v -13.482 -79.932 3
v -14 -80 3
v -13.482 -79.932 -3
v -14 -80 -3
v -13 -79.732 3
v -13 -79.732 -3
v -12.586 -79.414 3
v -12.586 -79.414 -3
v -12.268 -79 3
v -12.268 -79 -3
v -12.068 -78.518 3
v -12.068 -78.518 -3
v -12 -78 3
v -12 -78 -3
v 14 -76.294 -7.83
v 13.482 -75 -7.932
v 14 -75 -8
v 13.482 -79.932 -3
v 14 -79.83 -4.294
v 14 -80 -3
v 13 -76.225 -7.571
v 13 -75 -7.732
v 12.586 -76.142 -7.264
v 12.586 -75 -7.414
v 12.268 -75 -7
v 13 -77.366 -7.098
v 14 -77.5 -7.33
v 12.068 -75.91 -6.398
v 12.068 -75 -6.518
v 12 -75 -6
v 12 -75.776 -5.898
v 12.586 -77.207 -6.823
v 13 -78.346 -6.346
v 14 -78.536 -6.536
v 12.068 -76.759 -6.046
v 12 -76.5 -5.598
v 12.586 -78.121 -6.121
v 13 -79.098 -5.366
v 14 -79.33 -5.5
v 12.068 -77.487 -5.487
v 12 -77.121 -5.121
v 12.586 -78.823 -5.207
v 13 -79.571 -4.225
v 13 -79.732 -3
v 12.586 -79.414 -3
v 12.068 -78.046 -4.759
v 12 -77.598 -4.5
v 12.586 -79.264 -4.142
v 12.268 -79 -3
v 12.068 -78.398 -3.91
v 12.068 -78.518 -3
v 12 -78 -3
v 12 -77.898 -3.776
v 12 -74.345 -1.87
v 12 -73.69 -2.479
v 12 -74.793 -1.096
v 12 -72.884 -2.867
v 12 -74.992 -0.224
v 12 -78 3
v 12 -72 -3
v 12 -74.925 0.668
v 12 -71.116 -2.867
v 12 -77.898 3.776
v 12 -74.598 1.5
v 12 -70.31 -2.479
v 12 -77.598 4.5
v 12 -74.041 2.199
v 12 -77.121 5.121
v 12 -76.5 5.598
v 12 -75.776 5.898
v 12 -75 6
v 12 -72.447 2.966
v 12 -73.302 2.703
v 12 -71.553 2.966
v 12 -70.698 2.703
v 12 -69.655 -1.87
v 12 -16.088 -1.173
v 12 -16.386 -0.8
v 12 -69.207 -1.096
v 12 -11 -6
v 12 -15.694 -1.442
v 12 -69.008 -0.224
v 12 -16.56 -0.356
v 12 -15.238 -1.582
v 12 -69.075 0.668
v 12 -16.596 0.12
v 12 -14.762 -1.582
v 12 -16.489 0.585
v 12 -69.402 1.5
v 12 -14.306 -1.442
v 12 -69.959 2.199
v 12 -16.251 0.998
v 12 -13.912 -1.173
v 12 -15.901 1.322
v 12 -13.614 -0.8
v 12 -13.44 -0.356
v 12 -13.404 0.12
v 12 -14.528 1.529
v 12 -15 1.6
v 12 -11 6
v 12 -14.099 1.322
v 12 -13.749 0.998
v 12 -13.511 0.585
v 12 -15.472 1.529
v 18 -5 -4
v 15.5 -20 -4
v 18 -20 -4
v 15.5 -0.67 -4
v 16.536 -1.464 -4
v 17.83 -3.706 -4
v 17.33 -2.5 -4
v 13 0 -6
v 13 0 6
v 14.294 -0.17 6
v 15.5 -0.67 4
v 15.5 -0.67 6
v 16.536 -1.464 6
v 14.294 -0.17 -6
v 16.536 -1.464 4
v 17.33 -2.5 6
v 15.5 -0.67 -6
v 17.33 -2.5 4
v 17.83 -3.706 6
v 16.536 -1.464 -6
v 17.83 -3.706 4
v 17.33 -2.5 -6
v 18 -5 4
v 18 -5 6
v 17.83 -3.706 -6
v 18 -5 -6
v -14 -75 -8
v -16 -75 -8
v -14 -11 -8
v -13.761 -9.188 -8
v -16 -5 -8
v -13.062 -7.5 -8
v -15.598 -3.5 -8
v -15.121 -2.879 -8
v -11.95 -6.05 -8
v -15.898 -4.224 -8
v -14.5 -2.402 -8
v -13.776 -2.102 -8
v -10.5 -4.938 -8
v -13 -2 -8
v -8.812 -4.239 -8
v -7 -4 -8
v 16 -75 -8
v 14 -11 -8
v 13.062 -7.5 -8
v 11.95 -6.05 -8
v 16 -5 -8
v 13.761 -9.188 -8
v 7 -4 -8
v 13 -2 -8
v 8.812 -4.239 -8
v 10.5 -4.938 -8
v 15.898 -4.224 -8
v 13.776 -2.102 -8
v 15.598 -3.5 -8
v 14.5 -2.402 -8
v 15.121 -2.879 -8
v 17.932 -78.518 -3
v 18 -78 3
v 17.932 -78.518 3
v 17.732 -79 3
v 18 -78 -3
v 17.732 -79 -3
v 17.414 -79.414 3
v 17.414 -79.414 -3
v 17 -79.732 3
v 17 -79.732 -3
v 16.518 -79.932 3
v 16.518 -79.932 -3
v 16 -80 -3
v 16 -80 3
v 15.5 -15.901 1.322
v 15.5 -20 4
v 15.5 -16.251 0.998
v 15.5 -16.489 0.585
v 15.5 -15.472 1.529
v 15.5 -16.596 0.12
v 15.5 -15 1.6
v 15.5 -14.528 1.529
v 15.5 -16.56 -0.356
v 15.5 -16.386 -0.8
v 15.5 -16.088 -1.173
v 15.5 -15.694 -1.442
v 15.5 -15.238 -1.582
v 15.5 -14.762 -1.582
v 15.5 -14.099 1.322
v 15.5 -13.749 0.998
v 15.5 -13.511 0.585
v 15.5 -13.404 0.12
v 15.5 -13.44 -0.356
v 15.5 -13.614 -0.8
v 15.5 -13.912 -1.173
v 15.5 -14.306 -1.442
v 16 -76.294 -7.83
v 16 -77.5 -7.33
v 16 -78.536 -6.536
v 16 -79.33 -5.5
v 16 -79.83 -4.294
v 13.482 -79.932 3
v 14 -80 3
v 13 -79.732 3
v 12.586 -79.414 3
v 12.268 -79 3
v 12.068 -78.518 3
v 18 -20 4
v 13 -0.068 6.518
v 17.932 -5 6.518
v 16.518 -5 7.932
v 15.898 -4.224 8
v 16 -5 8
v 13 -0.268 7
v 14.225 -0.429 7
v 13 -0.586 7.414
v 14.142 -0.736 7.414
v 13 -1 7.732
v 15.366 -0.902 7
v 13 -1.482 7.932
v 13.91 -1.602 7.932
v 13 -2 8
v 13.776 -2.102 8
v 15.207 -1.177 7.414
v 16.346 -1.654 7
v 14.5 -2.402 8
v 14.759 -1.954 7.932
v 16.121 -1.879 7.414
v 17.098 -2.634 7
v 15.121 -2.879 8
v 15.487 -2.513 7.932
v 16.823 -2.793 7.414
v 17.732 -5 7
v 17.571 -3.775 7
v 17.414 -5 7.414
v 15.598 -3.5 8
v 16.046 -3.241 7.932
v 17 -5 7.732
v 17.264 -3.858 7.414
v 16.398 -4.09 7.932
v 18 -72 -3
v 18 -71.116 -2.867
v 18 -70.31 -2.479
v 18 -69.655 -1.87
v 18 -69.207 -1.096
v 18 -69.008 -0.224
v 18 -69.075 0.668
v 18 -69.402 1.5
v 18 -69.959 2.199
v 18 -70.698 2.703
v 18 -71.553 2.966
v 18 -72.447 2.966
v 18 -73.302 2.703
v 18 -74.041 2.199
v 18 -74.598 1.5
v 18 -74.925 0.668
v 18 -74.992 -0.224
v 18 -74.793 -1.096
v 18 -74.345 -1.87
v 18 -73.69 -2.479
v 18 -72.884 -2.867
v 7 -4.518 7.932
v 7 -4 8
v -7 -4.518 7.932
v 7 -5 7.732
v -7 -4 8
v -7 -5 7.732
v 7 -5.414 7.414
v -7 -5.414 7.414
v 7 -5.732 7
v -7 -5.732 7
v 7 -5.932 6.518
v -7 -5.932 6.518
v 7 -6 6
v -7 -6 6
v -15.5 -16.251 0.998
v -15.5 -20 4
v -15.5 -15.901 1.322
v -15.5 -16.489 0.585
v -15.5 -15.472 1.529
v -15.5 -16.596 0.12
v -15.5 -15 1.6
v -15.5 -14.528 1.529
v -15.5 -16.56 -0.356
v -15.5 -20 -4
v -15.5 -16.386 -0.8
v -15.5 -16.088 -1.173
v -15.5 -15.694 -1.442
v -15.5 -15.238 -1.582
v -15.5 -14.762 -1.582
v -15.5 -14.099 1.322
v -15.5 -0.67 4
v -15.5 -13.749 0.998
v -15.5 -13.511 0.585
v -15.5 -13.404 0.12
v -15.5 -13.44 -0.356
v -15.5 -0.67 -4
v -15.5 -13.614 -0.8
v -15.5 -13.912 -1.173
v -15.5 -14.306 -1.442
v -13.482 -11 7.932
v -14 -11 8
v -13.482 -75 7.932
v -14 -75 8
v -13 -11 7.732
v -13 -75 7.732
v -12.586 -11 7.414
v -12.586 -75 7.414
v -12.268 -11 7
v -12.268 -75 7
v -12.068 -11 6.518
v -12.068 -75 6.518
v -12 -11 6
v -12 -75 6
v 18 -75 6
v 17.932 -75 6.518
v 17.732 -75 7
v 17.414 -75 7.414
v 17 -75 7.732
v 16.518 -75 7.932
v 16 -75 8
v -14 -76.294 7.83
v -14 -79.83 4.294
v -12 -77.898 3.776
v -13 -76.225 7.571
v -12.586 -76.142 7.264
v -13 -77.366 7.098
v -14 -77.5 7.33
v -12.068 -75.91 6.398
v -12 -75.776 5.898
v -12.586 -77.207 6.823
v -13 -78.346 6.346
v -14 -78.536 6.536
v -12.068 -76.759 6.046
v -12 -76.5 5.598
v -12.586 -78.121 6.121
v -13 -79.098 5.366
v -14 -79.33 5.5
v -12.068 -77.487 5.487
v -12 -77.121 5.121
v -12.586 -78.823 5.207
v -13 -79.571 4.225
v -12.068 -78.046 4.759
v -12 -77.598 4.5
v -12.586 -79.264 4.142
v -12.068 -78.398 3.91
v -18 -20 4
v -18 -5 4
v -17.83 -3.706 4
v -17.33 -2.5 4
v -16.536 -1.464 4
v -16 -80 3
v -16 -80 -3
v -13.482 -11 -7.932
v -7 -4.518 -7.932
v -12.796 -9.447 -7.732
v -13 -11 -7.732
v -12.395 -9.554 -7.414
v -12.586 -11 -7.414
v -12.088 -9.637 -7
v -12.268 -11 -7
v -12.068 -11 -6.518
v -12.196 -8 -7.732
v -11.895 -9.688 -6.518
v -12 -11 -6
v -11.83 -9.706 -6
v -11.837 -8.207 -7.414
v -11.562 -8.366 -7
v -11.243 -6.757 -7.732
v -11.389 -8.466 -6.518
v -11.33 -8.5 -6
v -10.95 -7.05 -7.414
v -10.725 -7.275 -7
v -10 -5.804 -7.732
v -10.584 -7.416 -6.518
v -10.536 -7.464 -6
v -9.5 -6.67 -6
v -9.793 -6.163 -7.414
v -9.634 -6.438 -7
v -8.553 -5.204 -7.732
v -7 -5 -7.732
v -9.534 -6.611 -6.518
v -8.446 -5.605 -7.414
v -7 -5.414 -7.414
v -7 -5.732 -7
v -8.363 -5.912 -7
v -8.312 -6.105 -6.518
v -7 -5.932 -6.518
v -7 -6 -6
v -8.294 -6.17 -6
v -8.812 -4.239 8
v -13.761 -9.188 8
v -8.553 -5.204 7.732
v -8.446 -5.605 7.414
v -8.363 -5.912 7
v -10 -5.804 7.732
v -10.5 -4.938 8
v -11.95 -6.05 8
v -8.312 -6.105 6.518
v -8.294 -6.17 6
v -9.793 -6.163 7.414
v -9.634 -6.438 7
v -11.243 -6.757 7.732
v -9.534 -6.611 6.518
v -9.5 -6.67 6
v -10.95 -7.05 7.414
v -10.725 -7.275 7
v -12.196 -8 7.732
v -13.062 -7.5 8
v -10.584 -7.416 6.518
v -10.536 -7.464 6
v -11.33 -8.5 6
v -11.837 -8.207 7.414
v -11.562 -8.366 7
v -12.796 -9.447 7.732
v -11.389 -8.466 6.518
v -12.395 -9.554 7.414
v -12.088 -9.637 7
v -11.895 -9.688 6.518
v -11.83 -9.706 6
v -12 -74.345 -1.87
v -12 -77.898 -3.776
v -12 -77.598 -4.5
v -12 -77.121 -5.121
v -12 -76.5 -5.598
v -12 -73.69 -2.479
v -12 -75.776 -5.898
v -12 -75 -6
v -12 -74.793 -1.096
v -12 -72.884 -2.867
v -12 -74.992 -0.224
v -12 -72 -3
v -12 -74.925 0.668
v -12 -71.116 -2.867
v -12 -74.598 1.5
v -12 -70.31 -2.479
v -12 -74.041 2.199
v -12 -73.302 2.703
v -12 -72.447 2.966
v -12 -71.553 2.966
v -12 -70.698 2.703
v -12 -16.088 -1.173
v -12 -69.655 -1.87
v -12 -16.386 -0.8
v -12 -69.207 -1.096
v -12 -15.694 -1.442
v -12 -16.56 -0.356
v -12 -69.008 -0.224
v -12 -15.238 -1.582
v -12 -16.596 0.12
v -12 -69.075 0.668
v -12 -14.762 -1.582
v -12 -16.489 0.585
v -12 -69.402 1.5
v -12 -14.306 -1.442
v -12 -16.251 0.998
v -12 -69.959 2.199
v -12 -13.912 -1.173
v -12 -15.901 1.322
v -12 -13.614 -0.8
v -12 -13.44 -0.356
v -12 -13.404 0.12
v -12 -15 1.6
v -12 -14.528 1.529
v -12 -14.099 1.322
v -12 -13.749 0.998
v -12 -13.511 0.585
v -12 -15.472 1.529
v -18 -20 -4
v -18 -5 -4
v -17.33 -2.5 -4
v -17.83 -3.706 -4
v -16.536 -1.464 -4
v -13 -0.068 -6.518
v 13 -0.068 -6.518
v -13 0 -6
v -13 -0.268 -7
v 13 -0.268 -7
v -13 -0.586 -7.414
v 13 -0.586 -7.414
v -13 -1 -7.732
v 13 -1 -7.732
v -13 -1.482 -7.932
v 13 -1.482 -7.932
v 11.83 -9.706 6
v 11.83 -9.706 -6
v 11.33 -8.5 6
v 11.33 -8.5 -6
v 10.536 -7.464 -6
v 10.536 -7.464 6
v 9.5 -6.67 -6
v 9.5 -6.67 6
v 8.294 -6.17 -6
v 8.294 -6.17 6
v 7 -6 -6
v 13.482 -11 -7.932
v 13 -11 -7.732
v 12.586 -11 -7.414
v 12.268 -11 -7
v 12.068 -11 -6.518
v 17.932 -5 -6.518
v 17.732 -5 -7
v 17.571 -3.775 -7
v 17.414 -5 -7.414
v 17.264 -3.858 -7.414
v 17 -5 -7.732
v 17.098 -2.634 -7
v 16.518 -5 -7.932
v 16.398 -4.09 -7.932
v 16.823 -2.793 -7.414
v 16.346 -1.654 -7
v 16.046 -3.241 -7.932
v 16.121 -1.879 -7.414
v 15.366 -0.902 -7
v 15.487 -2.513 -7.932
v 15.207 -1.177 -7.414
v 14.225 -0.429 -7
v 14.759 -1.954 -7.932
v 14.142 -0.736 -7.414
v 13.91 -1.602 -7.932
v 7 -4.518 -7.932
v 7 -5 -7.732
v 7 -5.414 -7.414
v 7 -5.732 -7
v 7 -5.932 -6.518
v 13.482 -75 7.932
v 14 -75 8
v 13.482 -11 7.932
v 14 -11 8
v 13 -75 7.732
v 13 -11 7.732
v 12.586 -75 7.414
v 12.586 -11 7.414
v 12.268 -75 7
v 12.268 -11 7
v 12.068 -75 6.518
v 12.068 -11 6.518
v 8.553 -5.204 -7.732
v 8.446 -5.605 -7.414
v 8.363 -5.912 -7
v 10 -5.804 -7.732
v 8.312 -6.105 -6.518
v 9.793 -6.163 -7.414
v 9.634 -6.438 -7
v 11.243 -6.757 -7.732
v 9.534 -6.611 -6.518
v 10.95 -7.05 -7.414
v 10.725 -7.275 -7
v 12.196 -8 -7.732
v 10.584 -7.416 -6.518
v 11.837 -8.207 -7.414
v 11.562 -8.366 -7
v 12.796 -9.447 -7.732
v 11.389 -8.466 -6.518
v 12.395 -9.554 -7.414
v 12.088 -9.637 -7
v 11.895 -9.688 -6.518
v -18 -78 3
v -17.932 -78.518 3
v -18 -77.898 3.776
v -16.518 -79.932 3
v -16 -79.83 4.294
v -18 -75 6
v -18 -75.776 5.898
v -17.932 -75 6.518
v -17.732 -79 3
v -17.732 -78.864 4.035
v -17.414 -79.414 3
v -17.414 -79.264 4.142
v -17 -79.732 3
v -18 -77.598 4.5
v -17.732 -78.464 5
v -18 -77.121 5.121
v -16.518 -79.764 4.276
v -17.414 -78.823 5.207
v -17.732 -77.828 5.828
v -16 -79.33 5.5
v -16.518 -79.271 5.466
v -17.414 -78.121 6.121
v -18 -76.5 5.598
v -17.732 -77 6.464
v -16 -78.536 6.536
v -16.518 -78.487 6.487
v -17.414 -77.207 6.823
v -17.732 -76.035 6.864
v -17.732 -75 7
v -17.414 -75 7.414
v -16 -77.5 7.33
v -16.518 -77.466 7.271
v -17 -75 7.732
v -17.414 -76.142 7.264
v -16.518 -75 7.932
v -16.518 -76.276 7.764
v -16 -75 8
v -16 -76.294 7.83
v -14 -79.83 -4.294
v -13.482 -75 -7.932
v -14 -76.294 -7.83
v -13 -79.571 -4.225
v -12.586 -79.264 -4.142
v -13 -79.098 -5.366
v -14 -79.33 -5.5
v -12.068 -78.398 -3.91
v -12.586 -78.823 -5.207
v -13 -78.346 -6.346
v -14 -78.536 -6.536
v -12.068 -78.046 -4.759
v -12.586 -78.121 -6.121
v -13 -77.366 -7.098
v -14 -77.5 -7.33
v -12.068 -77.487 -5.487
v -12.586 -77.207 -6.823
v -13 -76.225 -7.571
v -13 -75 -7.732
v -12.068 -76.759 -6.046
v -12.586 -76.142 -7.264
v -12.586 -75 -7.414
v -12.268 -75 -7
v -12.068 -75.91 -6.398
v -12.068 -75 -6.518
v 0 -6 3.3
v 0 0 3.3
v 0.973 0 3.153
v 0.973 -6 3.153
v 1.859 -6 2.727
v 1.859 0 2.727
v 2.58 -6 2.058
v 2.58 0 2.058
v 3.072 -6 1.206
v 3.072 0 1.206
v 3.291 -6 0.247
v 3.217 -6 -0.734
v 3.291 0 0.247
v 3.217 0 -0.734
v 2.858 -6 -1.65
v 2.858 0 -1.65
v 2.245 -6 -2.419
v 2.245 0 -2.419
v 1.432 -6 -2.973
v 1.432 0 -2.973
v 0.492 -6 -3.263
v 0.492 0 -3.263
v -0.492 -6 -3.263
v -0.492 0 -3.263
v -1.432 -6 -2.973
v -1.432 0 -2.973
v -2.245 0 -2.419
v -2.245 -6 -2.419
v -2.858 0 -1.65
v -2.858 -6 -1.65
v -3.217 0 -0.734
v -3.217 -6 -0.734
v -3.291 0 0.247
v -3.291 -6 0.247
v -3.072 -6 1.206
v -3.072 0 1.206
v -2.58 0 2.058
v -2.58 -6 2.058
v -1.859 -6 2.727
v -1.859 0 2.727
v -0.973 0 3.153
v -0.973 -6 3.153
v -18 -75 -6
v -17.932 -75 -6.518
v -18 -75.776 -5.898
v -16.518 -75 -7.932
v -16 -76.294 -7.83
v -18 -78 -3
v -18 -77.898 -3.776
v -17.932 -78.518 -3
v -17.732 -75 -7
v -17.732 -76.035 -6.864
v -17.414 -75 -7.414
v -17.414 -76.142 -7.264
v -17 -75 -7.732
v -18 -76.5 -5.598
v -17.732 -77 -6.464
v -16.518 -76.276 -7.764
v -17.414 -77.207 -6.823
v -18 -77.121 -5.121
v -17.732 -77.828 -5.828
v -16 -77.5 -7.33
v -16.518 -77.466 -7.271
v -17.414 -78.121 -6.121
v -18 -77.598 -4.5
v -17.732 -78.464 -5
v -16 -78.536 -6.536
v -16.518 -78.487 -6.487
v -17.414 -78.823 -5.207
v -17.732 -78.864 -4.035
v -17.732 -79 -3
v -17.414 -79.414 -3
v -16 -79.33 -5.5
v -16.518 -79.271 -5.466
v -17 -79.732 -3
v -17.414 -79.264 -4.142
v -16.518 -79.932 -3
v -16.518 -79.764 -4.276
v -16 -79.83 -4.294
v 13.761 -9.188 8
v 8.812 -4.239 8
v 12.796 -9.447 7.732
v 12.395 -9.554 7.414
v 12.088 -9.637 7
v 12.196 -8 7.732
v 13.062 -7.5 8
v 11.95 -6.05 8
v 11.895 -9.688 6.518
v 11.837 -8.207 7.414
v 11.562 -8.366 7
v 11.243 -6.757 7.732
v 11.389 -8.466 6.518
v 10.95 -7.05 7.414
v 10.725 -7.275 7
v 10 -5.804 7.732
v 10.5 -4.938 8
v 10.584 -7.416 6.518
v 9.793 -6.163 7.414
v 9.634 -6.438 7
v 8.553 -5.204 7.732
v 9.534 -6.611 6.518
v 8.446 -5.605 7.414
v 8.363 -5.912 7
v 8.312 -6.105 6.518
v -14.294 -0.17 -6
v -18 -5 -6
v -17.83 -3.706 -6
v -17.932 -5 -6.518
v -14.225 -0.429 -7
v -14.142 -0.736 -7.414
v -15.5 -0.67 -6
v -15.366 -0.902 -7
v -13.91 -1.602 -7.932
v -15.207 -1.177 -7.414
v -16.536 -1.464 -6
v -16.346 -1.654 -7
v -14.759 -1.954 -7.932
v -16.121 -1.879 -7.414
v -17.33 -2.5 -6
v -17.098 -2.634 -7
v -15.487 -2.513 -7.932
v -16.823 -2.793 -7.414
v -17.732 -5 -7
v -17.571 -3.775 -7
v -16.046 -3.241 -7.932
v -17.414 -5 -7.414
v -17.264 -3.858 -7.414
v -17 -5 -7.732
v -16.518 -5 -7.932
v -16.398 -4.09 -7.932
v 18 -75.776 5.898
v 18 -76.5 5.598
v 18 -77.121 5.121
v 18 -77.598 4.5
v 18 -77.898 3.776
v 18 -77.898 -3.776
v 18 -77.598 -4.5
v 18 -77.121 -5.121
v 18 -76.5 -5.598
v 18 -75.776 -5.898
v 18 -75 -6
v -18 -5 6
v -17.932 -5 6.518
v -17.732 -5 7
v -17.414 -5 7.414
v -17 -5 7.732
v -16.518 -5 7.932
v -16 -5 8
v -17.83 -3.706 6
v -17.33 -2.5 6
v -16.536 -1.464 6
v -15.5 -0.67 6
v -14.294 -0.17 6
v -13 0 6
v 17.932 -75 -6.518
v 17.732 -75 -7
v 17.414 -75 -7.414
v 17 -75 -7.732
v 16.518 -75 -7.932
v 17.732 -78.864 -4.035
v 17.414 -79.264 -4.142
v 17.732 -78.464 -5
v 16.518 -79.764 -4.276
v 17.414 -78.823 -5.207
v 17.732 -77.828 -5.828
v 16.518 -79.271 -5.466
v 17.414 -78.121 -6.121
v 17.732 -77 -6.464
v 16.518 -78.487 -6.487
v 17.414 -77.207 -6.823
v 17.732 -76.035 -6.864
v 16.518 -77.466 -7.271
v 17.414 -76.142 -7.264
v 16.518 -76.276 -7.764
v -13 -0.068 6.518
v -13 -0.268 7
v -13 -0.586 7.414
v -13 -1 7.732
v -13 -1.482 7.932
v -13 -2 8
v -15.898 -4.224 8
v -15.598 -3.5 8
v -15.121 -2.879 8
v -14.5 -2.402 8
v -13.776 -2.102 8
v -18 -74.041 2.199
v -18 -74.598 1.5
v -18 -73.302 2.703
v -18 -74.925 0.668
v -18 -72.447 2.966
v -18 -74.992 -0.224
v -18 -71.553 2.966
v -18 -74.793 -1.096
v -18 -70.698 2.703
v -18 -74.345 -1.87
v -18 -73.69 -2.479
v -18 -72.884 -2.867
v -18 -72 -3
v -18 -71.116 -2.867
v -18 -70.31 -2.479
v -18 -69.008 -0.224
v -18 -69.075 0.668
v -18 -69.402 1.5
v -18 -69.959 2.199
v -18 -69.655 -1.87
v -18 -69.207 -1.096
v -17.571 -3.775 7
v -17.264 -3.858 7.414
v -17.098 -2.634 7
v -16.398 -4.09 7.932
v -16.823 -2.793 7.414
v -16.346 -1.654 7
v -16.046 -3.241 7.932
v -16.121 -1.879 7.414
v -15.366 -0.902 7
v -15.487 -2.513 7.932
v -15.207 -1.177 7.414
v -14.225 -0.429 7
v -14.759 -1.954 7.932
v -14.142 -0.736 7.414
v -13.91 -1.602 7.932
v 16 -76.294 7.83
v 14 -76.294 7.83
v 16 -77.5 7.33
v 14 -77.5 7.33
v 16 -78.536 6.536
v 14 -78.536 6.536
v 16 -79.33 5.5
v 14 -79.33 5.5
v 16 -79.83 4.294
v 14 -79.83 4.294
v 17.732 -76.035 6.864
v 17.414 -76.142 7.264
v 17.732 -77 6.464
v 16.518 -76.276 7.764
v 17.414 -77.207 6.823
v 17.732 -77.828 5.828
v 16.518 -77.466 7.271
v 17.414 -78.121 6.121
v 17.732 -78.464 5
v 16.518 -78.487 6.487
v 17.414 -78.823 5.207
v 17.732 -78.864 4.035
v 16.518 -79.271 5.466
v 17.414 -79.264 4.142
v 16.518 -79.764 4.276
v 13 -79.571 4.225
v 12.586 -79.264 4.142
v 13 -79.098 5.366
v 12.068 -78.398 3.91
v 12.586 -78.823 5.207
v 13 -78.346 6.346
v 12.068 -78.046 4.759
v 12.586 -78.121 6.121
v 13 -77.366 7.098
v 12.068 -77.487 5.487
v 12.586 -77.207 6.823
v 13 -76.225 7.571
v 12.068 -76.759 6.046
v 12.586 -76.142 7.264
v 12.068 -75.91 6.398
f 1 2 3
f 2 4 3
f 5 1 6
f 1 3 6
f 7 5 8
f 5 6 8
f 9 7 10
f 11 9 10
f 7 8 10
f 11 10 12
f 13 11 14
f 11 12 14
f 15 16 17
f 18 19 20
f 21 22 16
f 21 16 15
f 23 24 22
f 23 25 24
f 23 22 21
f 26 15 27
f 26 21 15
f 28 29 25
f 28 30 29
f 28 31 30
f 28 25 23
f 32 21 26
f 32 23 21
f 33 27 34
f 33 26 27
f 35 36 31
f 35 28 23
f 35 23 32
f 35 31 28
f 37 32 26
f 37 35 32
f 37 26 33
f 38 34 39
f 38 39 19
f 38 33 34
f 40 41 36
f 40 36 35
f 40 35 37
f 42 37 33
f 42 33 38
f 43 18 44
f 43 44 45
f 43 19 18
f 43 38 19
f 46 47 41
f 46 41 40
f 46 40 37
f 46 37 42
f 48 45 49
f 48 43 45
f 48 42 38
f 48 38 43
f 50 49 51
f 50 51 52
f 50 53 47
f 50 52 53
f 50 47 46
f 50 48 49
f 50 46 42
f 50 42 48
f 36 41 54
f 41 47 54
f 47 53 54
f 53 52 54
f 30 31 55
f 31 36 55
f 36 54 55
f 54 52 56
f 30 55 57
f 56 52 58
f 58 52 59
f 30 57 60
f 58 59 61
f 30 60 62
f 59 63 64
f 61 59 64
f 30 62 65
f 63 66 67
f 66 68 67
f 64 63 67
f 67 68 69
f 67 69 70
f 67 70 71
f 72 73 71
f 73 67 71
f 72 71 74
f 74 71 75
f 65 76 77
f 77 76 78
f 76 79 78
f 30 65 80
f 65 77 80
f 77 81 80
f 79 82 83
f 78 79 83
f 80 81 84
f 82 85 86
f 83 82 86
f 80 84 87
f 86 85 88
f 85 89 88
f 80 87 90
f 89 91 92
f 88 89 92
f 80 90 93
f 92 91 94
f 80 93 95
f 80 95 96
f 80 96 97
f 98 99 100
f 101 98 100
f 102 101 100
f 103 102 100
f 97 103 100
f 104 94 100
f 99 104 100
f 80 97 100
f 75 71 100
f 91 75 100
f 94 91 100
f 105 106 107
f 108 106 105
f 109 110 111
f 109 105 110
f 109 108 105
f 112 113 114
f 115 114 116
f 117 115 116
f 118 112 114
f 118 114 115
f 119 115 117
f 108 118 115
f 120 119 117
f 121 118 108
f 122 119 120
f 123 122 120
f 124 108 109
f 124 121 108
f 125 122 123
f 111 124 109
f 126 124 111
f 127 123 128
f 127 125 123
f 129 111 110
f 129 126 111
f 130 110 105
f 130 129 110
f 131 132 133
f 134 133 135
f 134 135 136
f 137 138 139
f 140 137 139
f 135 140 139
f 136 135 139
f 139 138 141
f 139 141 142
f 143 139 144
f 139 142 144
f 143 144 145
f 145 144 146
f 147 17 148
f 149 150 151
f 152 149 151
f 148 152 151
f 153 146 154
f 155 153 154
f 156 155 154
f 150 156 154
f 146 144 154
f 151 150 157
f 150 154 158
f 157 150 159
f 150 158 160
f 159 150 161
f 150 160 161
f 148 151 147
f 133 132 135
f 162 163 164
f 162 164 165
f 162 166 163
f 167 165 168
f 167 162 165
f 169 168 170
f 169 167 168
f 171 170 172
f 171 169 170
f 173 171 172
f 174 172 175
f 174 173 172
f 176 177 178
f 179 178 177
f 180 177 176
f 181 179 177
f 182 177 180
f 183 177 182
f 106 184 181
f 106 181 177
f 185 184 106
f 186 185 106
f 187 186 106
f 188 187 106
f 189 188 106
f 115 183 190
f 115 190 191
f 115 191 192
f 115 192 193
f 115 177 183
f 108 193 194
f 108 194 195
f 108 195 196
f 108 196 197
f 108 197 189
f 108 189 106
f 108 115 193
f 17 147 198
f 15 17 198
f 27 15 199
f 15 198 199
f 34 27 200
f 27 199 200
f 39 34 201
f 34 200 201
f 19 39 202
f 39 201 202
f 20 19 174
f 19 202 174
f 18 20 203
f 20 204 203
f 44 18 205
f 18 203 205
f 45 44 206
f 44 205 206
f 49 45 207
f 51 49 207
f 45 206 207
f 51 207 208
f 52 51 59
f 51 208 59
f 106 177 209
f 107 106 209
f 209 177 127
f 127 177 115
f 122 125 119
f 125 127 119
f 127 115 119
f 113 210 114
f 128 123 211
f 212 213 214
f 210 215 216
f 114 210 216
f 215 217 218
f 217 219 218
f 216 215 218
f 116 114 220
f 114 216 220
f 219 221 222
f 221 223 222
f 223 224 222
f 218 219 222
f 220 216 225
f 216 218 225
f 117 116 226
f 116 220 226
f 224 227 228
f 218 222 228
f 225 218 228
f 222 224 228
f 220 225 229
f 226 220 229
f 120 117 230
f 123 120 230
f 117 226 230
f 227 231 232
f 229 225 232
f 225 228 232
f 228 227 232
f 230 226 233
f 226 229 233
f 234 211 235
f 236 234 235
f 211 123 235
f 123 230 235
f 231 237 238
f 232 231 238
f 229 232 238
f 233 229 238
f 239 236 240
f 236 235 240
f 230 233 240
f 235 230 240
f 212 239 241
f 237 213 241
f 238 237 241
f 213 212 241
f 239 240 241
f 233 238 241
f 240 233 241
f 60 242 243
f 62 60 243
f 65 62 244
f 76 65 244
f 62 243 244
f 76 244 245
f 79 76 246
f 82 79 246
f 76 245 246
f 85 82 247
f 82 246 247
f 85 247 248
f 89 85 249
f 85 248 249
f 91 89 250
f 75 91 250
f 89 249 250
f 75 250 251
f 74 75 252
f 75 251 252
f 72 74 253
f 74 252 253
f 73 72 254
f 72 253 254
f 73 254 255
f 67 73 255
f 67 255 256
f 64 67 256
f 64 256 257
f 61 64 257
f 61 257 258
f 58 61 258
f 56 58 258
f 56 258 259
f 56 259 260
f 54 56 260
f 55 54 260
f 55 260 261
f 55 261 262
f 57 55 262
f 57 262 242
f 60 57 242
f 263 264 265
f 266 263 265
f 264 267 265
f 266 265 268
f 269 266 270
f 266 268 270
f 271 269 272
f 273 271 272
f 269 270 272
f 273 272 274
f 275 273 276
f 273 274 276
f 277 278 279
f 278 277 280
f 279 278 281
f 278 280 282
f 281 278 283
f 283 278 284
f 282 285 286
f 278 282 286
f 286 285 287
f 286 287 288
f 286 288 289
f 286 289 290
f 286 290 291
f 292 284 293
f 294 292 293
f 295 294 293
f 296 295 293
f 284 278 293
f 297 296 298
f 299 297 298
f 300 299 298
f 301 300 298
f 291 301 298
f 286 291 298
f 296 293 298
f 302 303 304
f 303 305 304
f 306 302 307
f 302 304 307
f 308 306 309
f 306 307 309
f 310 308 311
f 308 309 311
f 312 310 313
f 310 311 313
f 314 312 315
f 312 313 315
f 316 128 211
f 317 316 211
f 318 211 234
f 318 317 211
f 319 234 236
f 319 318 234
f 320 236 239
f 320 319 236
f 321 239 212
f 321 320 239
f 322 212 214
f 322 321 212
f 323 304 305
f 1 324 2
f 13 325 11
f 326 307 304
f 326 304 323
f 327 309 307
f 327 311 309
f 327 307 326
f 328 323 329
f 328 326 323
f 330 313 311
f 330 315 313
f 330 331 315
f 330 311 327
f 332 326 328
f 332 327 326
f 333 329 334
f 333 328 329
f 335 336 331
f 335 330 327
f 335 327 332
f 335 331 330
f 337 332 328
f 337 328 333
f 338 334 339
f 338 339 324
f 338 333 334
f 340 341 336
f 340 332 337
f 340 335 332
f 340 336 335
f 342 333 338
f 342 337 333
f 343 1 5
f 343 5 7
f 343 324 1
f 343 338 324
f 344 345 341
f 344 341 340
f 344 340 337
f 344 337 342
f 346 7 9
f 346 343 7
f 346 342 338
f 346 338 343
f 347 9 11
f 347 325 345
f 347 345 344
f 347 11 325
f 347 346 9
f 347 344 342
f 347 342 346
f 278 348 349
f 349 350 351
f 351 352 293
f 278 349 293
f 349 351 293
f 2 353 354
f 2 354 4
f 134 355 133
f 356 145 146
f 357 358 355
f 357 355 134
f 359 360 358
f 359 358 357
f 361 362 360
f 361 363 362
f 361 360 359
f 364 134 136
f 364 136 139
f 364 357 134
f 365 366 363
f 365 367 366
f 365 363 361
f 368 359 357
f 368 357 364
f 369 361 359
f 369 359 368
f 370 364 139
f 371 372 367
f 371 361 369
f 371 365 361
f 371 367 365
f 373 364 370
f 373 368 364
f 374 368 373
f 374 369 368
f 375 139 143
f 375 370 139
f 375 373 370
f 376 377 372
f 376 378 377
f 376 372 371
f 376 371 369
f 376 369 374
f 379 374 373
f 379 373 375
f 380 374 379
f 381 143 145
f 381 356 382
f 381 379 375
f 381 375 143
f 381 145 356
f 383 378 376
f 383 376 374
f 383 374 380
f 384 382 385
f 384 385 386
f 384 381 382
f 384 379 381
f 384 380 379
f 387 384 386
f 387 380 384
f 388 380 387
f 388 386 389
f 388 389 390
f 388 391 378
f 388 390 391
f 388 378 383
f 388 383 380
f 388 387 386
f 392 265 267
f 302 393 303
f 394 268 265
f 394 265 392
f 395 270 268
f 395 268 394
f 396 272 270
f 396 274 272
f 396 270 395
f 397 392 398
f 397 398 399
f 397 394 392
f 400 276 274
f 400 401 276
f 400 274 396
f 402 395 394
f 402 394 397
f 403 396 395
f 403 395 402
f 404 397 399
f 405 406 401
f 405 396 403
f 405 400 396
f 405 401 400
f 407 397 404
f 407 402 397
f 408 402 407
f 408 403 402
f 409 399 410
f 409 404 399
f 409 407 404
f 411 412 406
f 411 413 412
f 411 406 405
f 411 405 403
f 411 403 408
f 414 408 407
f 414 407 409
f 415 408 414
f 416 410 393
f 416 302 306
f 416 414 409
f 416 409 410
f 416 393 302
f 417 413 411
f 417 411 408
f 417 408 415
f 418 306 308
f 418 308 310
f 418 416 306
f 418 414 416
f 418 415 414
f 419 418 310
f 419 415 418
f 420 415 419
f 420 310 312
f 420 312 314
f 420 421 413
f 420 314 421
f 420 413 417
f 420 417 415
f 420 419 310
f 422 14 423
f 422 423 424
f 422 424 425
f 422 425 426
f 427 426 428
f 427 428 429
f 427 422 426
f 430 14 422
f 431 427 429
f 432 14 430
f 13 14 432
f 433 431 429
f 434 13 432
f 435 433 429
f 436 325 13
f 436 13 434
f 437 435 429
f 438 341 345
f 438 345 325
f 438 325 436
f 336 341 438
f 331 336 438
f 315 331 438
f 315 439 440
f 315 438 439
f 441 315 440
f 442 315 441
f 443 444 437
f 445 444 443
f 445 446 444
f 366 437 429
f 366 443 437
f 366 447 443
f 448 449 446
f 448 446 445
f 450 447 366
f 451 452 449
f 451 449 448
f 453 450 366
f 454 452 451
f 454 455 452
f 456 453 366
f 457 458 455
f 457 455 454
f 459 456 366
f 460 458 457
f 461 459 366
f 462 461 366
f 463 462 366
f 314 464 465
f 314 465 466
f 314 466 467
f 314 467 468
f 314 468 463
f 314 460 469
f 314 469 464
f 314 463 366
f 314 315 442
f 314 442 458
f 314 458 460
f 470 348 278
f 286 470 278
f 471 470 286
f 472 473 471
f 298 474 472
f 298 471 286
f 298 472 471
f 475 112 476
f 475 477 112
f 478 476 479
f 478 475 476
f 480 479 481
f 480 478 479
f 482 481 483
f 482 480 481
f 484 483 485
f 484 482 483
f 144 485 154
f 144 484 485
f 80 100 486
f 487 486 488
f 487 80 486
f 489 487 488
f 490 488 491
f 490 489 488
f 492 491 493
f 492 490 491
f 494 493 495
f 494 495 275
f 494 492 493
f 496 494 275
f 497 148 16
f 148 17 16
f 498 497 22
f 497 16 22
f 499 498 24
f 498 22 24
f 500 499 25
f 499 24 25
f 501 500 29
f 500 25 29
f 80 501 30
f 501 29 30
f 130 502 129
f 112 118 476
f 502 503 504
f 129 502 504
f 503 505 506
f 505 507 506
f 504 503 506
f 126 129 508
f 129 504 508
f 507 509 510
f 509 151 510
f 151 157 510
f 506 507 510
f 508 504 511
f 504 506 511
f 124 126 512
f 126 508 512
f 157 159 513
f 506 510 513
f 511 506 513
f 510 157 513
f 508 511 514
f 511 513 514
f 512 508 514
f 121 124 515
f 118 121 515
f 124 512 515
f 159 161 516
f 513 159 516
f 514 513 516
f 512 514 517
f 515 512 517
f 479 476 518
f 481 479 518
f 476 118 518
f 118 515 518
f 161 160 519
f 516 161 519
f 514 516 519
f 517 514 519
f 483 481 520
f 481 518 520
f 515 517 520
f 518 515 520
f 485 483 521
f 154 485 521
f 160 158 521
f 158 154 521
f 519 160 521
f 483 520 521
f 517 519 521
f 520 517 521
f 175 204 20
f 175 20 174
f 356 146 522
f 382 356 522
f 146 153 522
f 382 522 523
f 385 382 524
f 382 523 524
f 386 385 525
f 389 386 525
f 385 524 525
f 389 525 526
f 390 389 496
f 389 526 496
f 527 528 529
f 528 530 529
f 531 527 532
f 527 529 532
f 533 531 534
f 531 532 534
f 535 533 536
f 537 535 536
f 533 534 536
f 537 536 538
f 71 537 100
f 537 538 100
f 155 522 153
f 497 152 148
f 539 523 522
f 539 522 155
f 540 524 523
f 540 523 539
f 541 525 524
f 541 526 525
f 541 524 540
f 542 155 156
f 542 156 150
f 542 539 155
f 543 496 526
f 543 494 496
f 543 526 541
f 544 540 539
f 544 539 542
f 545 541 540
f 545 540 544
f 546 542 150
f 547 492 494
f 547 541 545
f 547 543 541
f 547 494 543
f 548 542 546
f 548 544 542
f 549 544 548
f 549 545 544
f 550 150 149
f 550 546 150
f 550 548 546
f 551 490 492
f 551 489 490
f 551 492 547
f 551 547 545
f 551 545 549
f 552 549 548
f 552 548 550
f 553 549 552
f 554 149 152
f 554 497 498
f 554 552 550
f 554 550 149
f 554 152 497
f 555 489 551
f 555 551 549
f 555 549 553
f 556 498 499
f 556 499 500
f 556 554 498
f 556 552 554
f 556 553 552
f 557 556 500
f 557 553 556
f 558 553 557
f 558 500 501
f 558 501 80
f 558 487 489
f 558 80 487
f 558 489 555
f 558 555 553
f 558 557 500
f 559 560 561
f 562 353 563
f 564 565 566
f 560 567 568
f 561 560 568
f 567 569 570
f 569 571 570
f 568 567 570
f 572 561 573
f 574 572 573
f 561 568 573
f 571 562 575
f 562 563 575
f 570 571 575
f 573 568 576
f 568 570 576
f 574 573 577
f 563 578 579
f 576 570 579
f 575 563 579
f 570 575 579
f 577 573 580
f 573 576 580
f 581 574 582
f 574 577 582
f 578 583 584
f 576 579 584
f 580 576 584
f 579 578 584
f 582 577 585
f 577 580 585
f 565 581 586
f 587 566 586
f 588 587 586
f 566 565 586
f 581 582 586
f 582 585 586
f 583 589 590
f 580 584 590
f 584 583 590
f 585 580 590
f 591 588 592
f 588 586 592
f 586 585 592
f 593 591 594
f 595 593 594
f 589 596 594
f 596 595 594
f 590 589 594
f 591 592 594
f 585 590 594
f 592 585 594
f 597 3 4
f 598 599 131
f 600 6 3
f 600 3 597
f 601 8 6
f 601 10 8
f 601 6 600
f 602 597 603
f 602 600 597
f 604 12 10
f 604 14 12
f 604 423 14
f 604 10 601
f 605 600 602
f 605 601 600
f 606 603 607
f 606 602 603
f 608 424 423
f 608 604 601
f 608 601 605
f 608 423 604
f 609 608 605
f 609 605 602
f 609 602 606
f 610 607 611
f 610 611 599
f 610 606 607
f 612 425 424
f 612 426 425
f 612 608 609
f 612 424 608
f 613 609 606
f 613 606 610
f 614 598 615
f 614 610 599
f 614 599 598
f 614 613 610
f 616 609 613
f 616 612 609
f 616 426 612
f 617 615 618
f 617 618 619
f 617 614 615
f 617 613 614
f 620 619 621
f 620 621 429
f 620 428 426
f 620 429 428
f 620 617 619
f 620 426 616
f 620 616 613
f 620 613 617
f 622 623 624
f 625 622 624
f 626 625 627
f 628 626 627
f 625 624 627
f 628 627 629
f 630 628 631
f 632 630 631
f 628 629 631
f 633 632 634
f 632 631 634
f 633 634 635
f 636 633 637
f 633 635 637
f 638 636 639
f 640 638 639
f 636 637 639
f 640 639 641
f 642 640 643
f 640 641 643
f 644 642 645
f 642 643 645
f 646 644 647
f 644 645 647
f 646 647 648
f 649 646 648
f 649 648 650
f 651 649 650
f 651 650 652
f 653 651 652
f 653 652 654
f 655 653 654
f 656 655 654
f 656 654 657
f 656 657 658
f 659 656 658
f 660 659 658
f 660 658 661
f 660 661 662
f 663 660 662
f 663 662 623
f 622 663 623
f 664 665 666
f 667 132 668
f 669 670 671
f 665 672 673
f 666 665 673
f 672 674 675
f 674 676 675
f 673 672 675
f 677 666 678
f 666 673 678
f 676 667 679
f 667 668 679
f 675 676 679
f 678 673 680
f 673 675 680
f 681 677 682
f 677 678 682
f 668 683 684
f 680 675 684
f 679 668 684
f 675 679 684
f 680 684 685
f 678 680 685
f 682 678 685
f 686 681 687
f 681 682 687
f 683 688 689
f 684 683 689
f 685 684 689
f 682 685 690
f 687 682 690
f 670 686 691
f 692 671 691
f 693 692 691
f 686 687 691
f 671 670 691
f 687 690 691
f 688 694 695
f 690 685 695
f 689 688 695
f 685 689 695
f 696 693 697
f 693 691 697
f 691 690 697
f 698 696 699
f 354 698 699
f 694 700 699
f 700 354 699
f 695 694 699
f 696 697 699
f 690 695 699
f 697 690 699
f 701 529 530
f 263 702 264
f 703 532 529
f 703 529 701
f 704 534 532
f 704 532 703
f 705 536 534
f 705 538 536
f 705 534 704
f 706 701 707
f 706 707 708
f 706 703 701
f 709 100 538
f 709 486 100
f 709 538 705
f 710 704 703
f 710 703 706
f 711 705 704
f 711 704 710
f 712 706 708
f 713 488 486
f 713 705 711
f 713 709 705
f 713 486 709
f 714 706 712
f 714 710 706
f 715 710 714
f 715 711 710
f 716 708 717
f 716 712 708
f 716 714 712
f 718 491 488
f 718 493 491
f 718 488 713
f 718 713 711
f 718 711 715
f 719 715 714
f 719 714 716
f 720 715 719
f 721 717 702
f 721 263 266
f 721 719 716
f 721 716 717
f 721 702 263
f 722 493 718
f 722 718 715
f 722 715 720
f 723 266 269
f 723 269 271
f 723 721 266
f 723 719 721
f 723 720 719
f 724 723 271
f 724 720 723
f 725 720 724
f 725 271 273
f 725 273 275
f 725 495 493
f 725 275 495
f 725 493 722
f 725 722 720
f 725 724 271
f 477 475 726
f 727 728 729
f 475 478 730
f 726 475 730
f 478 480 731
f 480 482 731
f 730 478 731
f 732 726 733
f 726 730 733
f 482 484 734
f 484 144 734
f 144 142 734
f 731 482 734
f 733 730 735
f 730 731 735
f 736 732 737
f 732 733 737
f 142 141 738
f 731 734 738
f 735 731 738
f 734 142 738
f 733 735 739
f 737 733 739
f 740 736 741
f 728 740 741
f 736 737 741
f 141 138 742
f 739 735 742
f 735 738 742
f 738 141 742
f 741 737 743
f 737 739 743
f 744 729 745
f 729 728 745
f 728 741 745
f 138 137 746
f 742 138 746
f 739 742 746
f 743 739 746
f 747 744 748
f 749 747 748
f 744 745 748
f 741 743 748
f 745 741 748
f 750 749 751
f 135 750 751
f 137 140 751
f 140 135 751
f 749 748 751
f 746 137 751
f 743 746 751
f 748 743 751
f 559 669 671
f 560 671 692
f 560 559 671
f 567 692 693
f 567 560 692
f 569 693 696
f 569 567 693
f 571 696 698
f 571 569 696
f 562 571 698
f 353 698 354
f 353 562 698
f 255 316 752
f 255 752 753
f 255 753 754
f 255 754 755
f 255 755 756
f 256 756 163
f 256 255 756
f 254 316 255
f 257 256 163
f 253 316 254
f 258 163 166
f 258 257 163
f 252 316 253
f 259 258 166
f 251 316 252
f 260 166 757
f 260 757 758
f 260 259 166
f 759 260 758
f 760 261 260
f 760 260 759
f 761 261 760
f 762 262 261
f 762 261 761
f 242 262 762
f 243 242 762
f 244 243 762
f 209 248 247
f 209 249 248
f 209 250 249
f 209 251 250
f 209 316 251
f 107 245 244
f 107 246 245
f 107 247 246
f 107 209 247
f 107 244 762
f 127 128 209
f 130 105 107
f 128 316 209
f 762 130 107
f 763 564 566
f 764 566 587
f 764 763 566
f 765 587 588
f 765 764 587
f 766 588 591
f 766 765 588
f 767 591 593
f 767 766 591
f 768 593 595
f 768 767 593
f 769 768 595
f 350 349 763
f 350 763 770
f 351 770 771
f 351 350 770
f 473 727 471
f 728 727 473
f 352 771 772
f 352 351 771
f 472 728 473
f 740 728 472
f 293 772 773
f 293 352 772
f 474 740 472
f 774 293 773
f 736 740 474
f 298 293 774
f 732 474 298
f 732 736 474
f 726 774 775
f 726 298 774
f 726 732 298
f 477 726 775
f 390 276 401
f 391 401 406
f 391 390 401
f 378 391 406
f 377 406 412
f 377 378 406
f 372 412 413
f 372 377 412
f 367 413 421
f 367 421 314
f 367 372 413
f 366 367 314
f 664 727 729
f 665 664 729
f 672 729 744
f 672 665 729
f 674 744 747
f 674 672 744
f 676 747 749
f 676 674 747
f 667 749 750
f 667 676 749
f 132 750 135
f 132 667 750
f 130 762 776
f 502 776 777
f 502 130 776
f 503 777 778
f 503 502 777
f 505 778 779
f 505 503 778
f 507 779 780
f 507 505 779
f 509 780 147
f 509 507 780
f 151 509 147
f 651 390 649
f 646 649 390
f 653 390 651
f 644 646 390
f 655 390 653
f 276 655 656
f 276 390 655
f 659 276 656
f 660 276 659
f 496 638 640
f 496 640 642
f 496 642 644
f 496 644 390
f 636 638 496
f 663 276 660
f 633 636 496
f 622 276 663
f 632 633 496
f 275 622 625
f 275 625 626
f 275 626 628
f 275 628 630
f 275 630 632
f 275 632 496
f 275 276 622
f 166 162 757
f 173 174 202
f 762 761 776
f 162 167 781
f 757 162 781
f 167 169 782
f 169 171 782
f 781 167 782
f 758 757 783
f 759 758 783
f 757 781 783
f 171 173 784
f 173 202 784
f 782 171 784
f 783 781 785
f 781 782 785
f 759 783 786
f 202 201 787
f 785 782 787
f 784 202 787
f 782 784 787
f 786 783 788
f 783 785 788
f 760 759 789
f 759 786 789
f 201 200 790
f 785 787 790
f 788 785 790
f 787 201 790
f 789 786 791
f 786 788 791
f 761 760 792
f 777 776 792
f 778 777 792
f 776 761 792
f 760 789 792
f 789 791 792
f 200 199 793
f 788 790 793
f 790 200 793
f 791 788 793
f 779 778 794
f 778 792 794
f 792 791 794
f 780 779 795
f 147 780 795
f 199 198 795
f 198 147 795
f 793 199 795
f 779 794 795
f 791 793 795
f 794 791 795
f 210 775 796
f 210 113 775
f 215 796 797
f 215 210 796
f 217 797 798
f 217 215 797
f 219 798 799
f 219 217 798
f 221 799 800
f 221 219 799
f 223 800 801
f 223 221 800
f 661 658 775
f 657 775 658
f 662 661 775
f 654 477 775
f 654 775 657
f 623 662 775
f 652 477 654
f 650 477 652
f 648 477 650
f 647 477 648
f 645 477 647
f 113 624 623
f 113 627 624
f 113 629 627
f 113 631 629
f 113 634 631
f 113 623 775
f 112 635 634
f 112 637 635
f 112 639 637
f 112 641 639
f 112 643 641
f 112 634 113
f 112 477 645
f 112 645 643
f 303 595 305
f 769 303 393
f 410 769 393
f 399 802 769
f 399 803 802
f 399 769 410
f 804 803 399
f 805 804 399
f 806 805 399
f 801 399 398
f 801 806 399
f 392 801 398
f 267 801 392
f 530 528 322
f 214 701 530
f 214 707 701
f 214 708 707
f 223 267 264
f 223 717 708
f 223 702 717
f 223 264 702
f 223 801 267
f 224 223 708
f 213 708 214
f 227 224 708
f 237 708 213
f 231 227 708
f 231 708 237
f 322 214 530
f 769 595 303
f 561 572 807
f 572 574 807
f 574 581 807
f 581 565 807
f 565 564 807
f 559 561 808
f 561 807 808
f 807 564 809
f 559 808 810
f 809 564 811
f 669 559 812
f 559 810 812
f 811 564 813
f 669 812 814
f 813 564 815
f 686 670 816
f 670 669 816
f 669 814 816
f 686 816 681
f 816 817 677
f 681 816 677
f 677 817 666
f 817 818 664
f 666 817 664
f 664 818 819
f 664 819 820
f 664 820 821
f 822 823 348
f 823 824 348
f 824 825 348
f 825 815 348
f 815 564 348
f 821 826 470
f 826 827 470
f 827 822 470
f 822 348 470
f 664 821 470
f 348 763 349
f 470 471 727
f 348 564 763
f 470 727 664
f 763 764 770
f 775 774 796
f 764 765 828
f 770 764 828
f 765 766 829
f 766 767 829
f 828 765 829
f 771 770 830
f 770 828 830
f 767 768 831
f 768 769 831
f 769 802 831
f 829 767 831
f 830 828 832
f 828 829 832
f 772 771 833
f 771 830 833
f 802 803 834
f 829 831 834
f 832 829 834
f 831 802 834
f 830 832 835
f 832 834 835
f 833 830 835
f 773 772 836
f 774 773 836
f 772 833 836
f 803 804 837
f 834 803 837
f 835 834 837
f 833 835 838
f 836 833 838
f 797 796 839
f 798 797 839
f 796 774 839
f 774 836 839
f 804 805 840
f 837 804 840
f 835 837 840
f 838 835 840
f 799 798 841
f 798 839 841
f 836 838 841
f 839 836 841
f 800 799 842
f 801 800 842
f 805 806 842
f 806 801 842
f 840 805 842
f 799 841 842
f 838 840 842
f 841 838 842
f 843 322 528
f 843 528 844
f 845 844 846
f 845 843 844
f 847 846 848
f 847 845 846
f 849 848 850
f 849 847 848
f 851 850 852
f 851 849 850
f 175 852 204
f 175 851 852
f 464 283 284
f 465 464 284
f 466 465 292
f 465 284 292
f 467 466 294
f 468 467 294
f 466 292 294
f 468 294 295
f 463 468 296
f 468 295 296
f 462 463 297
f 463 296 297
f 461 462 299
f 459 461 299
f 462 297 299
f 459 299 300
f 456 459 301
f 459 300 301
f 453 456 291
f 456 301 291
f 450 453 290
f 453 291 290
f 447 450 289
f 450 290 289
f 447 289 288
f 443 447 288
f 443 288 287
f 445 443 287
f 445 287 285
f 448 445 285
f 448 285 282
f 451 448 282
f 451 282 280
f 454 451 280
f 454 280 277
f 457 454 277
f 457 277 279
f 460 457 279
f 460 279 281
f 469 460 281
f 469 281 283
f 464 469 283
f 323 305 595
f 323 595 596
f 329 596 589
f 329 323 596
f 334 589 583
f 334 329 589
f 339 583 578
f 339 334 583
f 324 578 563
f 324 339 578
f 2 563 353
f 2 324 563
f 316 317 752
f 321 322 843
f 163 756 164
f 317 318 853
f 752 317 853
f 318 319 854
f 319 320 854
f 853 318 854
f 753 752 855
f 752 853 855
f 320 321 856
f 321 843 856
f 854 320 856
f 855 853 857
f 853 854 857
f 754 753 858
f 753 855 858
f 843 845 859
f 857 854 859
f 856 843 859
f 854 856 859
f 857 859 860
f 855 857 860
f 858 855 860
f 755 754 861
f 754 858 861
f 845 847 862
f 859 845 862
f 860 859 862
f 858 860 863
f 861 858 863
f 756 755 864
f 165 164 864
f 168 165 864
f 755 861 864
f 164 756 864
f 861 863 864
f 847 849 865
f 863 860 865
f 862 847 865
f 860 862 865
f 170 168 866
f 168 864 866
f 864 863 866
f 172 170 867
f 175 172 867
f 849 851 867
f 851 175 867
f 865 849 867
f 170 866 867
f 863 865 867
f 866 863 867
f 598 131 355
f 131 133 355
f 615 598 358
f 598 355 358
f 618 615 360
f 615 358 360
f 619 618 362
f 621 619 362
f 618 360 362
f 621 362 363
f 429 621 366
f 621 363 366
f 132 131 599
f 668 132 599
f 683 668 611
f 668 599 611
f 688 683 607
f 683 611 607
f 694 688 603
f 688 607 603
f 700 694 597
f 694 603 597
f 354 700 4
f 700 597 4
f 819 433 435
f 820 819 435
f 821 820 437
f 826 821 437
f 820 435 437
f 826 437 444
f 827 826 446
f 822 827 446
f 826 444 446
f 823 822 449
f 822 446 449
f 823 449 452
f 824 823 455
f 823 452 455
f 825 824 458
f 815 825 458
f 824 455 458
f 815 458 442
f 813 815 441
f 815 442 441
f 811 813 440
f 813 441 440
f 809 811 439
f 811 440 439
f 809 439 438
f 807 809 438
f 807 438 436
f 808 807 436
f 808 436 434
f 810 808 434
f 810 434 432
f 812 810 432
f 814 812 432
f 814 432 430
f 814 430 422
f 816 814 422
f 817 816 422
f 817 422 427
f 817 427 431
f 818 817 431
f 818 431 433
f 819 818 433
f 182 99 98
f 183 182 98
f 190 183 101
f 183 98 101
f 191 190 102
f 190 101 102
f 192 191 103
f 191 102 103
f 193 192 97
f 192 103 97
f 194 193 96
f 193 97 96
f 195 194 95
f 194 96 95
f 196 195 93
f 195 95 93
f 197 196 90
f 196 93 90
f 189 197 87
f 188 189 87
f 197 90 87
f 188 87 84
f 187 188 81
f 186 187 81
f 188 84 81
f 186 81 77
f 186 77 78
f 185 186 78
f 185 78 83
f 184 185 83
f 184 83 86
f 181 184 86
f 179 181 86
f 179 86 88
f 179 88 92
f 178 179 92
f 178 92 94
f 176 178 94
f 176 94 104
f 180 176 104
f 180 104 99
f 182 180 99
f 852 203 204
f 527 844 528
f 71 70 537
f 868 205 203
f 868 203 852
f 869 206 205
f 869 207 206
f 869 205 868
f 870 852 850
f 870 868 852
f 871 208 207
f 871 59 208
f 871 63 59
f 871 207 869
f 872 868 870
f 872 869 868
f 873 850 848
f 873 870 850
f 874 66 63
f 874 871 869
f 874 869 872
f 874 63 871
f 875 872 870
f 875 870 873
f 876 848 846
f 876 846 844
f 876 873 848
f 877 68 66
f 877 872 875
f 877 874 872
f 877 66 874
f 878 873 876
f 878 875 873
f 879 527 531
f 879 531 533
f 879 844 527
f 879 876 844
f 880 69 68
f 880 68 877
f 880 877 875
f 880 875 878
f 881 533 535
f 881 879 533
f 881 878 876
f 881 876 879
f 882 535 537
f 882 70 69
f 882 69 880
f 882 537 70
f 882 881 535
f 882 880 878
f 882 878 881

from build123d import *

# Parameters (mm, degrees)
SKETCH_1_W          = 36
SKETCH_1_H          = 16
EXTRUDE_1_DEPTH     = 80
SKETCH_3_W          = 24
SKETCH_3_H          = 74
CUT_EXTRUDE_1_DEPTH = 84.546394297
FILLET_1_R          = 5
FILLET_2_R          = 2
SKETCH_4_R          = 3
CUT_EXTRUDE_2_DEPTH = 89.090862182
SKETCH_2_R          = 3.3
CUT_EXTRUDE_3_DEPTH = 83.389319696
SKETCH_5_W          = 2.5
SKETCH_5_H          = 8
CUT_EXTRUDE_4_DEPTH = 20
SKETCH_6_R          = 1.6
CUT_EXTRUDE_5_DEPTH = 88.099081511


with BuildPart() as part:
    # 草图1 → 凸台-拉伸1 (new body)
    with BuildSketch(Plane(origin=(0, 0, 0), x_dir=(1, 0, 0), z_dir=(0, 1, 0))):
        Rectangle(SKETCH_1_W, SKETCH_1_H)
    extrude(amount=-EXTRUDE_1_DEPTH)

    # 草图3 → 切除-拉伸1 (cut, through all)
    with BuildSketch(Plane.XY.offset(8)):
        with Locations((0, -43)):
            Rectangle(SKETCH_3_W, SKETCH_3_H)
    extrude(amount=-CUT_EXTRUDE_1_DEPTH, mode=Mode.SUBTRACT)

    # 圆角1
    fillet_1_edges = [part.edges().sort_by_distance(p)[0] for p in [
        (15, -80, -8),
        (-15, -80, -8),
        (15, -80, 8),
        (-12, -6, 0),
        (12, -6, 0),
        (18, 0, 0),
        (-18, 0, 0),
        (-15, -80, 8),
    ]]
    fillet(fillet_1_edges, radius=FILLET_1_R)

    # 圆角2
    fillet_2_edges = [part.edges().sort_by_distance(p)[0] for p in [
        (-12, -43, -8),
        (-18, -40, -8),
        (0, 0, -8),
        (18, -40, -8),
        (12, -43, -8),
        (0, -6, -8),
        (16.535533906, -1.464466094, -8),
        (-16.535533906, -1.464466094, -8),
        (-18, -80, 0),
        (-18, -40, 8),
        (-18, -78.535533906, 6.535533906),
        (-18, -78.535533906, -6.535533906),
        (-12, -80, 0),
        (-12, -43, 8),
        (-12, -78.535533906, 6.535533906),
        (-12, -78.535533906, -6.535533906),
        (12, -43, 8),
        (12, -80, 0),
        (12, -78.535533906, 6.535533906),
        (12, -78.535533906, -6.535533906),
        (18, -80, 0),
        (18, -40, 8),
        (18, -78.535533906, 6.535533906),
        (18, -78.535533906, -6.535533906),
        (0, -6, 8),
        (0, 0, 8),
        (16.535533906, -1.464466094, 8),
        (-16.535533906, -1.464466094, 8),
        (10.535533906, -7.464466094, 8),
        (10.535533906, -7.464466094, -8),
        (-10.535533906, -7.464466094, 8),
        (-10.535533906, -7.464466094, -8),
    ]]
    fillet(fillet_2_edges, radius=FILLET_2_R)

    # 草图4 → 切除-拉伸2 (cut, through all)
    with BuildSketch(Plane(origin=(18, 0, 0), x_dir=(0, 0, -1), z_dir=(1, 0, 0))):
        with Locations((0, -72)):
            Circle(SKETCH_4_R)
    extrude(amount=-CUT_EXTRUDE_2_DEPTH, mode=Mode.SUBTRACT)

    # 草图2 → 切除-拉伸3 (cut, through all)
    with BuildSketch(Plane(origin=(0, 0, 0), x_dir=(1, 0, 0), z_dir=(0, 1, 0))):
        with Locations(Location((0, 0, 0), (0, 0, 270))):
            Circle(SKETCH_2_R)
    extrude(amount=-CUT_EXTRUDE_3_DEPTH, mode=Mode.SUBTRACT)

    # 草图5 → 切除-拉伸4 (cut)
    with BuildSketch(Plane(origin=(0, 0, 0), x_dir=(1, 0, 0), z_dir=(0, 1, 0))):
        with Locations((-16.75, 0)):
            Rectangle(SKETCH_5_W, SKETCH_5_H)
        with Locations((16.75, 0)):
            Rectangle(SKETCH_5_W, SKETCH_5_H)
    extrude(amount=-CUT_EXTRUDE_4_DEPTH, mode=Mode.SUBTRACT)

    # 草图6 → 切除-拉伸5 (cut, through all)
    with BuildSketch(Plane.ZY.offset(15.5)):
        with Locations((0, -15)):
            Circle(SKETCH_6_R)
    extrude(amount=-CUT_EXTRUDE_5_DEPTH, mode=Mode.SUBTRACT)


solid = part.part
